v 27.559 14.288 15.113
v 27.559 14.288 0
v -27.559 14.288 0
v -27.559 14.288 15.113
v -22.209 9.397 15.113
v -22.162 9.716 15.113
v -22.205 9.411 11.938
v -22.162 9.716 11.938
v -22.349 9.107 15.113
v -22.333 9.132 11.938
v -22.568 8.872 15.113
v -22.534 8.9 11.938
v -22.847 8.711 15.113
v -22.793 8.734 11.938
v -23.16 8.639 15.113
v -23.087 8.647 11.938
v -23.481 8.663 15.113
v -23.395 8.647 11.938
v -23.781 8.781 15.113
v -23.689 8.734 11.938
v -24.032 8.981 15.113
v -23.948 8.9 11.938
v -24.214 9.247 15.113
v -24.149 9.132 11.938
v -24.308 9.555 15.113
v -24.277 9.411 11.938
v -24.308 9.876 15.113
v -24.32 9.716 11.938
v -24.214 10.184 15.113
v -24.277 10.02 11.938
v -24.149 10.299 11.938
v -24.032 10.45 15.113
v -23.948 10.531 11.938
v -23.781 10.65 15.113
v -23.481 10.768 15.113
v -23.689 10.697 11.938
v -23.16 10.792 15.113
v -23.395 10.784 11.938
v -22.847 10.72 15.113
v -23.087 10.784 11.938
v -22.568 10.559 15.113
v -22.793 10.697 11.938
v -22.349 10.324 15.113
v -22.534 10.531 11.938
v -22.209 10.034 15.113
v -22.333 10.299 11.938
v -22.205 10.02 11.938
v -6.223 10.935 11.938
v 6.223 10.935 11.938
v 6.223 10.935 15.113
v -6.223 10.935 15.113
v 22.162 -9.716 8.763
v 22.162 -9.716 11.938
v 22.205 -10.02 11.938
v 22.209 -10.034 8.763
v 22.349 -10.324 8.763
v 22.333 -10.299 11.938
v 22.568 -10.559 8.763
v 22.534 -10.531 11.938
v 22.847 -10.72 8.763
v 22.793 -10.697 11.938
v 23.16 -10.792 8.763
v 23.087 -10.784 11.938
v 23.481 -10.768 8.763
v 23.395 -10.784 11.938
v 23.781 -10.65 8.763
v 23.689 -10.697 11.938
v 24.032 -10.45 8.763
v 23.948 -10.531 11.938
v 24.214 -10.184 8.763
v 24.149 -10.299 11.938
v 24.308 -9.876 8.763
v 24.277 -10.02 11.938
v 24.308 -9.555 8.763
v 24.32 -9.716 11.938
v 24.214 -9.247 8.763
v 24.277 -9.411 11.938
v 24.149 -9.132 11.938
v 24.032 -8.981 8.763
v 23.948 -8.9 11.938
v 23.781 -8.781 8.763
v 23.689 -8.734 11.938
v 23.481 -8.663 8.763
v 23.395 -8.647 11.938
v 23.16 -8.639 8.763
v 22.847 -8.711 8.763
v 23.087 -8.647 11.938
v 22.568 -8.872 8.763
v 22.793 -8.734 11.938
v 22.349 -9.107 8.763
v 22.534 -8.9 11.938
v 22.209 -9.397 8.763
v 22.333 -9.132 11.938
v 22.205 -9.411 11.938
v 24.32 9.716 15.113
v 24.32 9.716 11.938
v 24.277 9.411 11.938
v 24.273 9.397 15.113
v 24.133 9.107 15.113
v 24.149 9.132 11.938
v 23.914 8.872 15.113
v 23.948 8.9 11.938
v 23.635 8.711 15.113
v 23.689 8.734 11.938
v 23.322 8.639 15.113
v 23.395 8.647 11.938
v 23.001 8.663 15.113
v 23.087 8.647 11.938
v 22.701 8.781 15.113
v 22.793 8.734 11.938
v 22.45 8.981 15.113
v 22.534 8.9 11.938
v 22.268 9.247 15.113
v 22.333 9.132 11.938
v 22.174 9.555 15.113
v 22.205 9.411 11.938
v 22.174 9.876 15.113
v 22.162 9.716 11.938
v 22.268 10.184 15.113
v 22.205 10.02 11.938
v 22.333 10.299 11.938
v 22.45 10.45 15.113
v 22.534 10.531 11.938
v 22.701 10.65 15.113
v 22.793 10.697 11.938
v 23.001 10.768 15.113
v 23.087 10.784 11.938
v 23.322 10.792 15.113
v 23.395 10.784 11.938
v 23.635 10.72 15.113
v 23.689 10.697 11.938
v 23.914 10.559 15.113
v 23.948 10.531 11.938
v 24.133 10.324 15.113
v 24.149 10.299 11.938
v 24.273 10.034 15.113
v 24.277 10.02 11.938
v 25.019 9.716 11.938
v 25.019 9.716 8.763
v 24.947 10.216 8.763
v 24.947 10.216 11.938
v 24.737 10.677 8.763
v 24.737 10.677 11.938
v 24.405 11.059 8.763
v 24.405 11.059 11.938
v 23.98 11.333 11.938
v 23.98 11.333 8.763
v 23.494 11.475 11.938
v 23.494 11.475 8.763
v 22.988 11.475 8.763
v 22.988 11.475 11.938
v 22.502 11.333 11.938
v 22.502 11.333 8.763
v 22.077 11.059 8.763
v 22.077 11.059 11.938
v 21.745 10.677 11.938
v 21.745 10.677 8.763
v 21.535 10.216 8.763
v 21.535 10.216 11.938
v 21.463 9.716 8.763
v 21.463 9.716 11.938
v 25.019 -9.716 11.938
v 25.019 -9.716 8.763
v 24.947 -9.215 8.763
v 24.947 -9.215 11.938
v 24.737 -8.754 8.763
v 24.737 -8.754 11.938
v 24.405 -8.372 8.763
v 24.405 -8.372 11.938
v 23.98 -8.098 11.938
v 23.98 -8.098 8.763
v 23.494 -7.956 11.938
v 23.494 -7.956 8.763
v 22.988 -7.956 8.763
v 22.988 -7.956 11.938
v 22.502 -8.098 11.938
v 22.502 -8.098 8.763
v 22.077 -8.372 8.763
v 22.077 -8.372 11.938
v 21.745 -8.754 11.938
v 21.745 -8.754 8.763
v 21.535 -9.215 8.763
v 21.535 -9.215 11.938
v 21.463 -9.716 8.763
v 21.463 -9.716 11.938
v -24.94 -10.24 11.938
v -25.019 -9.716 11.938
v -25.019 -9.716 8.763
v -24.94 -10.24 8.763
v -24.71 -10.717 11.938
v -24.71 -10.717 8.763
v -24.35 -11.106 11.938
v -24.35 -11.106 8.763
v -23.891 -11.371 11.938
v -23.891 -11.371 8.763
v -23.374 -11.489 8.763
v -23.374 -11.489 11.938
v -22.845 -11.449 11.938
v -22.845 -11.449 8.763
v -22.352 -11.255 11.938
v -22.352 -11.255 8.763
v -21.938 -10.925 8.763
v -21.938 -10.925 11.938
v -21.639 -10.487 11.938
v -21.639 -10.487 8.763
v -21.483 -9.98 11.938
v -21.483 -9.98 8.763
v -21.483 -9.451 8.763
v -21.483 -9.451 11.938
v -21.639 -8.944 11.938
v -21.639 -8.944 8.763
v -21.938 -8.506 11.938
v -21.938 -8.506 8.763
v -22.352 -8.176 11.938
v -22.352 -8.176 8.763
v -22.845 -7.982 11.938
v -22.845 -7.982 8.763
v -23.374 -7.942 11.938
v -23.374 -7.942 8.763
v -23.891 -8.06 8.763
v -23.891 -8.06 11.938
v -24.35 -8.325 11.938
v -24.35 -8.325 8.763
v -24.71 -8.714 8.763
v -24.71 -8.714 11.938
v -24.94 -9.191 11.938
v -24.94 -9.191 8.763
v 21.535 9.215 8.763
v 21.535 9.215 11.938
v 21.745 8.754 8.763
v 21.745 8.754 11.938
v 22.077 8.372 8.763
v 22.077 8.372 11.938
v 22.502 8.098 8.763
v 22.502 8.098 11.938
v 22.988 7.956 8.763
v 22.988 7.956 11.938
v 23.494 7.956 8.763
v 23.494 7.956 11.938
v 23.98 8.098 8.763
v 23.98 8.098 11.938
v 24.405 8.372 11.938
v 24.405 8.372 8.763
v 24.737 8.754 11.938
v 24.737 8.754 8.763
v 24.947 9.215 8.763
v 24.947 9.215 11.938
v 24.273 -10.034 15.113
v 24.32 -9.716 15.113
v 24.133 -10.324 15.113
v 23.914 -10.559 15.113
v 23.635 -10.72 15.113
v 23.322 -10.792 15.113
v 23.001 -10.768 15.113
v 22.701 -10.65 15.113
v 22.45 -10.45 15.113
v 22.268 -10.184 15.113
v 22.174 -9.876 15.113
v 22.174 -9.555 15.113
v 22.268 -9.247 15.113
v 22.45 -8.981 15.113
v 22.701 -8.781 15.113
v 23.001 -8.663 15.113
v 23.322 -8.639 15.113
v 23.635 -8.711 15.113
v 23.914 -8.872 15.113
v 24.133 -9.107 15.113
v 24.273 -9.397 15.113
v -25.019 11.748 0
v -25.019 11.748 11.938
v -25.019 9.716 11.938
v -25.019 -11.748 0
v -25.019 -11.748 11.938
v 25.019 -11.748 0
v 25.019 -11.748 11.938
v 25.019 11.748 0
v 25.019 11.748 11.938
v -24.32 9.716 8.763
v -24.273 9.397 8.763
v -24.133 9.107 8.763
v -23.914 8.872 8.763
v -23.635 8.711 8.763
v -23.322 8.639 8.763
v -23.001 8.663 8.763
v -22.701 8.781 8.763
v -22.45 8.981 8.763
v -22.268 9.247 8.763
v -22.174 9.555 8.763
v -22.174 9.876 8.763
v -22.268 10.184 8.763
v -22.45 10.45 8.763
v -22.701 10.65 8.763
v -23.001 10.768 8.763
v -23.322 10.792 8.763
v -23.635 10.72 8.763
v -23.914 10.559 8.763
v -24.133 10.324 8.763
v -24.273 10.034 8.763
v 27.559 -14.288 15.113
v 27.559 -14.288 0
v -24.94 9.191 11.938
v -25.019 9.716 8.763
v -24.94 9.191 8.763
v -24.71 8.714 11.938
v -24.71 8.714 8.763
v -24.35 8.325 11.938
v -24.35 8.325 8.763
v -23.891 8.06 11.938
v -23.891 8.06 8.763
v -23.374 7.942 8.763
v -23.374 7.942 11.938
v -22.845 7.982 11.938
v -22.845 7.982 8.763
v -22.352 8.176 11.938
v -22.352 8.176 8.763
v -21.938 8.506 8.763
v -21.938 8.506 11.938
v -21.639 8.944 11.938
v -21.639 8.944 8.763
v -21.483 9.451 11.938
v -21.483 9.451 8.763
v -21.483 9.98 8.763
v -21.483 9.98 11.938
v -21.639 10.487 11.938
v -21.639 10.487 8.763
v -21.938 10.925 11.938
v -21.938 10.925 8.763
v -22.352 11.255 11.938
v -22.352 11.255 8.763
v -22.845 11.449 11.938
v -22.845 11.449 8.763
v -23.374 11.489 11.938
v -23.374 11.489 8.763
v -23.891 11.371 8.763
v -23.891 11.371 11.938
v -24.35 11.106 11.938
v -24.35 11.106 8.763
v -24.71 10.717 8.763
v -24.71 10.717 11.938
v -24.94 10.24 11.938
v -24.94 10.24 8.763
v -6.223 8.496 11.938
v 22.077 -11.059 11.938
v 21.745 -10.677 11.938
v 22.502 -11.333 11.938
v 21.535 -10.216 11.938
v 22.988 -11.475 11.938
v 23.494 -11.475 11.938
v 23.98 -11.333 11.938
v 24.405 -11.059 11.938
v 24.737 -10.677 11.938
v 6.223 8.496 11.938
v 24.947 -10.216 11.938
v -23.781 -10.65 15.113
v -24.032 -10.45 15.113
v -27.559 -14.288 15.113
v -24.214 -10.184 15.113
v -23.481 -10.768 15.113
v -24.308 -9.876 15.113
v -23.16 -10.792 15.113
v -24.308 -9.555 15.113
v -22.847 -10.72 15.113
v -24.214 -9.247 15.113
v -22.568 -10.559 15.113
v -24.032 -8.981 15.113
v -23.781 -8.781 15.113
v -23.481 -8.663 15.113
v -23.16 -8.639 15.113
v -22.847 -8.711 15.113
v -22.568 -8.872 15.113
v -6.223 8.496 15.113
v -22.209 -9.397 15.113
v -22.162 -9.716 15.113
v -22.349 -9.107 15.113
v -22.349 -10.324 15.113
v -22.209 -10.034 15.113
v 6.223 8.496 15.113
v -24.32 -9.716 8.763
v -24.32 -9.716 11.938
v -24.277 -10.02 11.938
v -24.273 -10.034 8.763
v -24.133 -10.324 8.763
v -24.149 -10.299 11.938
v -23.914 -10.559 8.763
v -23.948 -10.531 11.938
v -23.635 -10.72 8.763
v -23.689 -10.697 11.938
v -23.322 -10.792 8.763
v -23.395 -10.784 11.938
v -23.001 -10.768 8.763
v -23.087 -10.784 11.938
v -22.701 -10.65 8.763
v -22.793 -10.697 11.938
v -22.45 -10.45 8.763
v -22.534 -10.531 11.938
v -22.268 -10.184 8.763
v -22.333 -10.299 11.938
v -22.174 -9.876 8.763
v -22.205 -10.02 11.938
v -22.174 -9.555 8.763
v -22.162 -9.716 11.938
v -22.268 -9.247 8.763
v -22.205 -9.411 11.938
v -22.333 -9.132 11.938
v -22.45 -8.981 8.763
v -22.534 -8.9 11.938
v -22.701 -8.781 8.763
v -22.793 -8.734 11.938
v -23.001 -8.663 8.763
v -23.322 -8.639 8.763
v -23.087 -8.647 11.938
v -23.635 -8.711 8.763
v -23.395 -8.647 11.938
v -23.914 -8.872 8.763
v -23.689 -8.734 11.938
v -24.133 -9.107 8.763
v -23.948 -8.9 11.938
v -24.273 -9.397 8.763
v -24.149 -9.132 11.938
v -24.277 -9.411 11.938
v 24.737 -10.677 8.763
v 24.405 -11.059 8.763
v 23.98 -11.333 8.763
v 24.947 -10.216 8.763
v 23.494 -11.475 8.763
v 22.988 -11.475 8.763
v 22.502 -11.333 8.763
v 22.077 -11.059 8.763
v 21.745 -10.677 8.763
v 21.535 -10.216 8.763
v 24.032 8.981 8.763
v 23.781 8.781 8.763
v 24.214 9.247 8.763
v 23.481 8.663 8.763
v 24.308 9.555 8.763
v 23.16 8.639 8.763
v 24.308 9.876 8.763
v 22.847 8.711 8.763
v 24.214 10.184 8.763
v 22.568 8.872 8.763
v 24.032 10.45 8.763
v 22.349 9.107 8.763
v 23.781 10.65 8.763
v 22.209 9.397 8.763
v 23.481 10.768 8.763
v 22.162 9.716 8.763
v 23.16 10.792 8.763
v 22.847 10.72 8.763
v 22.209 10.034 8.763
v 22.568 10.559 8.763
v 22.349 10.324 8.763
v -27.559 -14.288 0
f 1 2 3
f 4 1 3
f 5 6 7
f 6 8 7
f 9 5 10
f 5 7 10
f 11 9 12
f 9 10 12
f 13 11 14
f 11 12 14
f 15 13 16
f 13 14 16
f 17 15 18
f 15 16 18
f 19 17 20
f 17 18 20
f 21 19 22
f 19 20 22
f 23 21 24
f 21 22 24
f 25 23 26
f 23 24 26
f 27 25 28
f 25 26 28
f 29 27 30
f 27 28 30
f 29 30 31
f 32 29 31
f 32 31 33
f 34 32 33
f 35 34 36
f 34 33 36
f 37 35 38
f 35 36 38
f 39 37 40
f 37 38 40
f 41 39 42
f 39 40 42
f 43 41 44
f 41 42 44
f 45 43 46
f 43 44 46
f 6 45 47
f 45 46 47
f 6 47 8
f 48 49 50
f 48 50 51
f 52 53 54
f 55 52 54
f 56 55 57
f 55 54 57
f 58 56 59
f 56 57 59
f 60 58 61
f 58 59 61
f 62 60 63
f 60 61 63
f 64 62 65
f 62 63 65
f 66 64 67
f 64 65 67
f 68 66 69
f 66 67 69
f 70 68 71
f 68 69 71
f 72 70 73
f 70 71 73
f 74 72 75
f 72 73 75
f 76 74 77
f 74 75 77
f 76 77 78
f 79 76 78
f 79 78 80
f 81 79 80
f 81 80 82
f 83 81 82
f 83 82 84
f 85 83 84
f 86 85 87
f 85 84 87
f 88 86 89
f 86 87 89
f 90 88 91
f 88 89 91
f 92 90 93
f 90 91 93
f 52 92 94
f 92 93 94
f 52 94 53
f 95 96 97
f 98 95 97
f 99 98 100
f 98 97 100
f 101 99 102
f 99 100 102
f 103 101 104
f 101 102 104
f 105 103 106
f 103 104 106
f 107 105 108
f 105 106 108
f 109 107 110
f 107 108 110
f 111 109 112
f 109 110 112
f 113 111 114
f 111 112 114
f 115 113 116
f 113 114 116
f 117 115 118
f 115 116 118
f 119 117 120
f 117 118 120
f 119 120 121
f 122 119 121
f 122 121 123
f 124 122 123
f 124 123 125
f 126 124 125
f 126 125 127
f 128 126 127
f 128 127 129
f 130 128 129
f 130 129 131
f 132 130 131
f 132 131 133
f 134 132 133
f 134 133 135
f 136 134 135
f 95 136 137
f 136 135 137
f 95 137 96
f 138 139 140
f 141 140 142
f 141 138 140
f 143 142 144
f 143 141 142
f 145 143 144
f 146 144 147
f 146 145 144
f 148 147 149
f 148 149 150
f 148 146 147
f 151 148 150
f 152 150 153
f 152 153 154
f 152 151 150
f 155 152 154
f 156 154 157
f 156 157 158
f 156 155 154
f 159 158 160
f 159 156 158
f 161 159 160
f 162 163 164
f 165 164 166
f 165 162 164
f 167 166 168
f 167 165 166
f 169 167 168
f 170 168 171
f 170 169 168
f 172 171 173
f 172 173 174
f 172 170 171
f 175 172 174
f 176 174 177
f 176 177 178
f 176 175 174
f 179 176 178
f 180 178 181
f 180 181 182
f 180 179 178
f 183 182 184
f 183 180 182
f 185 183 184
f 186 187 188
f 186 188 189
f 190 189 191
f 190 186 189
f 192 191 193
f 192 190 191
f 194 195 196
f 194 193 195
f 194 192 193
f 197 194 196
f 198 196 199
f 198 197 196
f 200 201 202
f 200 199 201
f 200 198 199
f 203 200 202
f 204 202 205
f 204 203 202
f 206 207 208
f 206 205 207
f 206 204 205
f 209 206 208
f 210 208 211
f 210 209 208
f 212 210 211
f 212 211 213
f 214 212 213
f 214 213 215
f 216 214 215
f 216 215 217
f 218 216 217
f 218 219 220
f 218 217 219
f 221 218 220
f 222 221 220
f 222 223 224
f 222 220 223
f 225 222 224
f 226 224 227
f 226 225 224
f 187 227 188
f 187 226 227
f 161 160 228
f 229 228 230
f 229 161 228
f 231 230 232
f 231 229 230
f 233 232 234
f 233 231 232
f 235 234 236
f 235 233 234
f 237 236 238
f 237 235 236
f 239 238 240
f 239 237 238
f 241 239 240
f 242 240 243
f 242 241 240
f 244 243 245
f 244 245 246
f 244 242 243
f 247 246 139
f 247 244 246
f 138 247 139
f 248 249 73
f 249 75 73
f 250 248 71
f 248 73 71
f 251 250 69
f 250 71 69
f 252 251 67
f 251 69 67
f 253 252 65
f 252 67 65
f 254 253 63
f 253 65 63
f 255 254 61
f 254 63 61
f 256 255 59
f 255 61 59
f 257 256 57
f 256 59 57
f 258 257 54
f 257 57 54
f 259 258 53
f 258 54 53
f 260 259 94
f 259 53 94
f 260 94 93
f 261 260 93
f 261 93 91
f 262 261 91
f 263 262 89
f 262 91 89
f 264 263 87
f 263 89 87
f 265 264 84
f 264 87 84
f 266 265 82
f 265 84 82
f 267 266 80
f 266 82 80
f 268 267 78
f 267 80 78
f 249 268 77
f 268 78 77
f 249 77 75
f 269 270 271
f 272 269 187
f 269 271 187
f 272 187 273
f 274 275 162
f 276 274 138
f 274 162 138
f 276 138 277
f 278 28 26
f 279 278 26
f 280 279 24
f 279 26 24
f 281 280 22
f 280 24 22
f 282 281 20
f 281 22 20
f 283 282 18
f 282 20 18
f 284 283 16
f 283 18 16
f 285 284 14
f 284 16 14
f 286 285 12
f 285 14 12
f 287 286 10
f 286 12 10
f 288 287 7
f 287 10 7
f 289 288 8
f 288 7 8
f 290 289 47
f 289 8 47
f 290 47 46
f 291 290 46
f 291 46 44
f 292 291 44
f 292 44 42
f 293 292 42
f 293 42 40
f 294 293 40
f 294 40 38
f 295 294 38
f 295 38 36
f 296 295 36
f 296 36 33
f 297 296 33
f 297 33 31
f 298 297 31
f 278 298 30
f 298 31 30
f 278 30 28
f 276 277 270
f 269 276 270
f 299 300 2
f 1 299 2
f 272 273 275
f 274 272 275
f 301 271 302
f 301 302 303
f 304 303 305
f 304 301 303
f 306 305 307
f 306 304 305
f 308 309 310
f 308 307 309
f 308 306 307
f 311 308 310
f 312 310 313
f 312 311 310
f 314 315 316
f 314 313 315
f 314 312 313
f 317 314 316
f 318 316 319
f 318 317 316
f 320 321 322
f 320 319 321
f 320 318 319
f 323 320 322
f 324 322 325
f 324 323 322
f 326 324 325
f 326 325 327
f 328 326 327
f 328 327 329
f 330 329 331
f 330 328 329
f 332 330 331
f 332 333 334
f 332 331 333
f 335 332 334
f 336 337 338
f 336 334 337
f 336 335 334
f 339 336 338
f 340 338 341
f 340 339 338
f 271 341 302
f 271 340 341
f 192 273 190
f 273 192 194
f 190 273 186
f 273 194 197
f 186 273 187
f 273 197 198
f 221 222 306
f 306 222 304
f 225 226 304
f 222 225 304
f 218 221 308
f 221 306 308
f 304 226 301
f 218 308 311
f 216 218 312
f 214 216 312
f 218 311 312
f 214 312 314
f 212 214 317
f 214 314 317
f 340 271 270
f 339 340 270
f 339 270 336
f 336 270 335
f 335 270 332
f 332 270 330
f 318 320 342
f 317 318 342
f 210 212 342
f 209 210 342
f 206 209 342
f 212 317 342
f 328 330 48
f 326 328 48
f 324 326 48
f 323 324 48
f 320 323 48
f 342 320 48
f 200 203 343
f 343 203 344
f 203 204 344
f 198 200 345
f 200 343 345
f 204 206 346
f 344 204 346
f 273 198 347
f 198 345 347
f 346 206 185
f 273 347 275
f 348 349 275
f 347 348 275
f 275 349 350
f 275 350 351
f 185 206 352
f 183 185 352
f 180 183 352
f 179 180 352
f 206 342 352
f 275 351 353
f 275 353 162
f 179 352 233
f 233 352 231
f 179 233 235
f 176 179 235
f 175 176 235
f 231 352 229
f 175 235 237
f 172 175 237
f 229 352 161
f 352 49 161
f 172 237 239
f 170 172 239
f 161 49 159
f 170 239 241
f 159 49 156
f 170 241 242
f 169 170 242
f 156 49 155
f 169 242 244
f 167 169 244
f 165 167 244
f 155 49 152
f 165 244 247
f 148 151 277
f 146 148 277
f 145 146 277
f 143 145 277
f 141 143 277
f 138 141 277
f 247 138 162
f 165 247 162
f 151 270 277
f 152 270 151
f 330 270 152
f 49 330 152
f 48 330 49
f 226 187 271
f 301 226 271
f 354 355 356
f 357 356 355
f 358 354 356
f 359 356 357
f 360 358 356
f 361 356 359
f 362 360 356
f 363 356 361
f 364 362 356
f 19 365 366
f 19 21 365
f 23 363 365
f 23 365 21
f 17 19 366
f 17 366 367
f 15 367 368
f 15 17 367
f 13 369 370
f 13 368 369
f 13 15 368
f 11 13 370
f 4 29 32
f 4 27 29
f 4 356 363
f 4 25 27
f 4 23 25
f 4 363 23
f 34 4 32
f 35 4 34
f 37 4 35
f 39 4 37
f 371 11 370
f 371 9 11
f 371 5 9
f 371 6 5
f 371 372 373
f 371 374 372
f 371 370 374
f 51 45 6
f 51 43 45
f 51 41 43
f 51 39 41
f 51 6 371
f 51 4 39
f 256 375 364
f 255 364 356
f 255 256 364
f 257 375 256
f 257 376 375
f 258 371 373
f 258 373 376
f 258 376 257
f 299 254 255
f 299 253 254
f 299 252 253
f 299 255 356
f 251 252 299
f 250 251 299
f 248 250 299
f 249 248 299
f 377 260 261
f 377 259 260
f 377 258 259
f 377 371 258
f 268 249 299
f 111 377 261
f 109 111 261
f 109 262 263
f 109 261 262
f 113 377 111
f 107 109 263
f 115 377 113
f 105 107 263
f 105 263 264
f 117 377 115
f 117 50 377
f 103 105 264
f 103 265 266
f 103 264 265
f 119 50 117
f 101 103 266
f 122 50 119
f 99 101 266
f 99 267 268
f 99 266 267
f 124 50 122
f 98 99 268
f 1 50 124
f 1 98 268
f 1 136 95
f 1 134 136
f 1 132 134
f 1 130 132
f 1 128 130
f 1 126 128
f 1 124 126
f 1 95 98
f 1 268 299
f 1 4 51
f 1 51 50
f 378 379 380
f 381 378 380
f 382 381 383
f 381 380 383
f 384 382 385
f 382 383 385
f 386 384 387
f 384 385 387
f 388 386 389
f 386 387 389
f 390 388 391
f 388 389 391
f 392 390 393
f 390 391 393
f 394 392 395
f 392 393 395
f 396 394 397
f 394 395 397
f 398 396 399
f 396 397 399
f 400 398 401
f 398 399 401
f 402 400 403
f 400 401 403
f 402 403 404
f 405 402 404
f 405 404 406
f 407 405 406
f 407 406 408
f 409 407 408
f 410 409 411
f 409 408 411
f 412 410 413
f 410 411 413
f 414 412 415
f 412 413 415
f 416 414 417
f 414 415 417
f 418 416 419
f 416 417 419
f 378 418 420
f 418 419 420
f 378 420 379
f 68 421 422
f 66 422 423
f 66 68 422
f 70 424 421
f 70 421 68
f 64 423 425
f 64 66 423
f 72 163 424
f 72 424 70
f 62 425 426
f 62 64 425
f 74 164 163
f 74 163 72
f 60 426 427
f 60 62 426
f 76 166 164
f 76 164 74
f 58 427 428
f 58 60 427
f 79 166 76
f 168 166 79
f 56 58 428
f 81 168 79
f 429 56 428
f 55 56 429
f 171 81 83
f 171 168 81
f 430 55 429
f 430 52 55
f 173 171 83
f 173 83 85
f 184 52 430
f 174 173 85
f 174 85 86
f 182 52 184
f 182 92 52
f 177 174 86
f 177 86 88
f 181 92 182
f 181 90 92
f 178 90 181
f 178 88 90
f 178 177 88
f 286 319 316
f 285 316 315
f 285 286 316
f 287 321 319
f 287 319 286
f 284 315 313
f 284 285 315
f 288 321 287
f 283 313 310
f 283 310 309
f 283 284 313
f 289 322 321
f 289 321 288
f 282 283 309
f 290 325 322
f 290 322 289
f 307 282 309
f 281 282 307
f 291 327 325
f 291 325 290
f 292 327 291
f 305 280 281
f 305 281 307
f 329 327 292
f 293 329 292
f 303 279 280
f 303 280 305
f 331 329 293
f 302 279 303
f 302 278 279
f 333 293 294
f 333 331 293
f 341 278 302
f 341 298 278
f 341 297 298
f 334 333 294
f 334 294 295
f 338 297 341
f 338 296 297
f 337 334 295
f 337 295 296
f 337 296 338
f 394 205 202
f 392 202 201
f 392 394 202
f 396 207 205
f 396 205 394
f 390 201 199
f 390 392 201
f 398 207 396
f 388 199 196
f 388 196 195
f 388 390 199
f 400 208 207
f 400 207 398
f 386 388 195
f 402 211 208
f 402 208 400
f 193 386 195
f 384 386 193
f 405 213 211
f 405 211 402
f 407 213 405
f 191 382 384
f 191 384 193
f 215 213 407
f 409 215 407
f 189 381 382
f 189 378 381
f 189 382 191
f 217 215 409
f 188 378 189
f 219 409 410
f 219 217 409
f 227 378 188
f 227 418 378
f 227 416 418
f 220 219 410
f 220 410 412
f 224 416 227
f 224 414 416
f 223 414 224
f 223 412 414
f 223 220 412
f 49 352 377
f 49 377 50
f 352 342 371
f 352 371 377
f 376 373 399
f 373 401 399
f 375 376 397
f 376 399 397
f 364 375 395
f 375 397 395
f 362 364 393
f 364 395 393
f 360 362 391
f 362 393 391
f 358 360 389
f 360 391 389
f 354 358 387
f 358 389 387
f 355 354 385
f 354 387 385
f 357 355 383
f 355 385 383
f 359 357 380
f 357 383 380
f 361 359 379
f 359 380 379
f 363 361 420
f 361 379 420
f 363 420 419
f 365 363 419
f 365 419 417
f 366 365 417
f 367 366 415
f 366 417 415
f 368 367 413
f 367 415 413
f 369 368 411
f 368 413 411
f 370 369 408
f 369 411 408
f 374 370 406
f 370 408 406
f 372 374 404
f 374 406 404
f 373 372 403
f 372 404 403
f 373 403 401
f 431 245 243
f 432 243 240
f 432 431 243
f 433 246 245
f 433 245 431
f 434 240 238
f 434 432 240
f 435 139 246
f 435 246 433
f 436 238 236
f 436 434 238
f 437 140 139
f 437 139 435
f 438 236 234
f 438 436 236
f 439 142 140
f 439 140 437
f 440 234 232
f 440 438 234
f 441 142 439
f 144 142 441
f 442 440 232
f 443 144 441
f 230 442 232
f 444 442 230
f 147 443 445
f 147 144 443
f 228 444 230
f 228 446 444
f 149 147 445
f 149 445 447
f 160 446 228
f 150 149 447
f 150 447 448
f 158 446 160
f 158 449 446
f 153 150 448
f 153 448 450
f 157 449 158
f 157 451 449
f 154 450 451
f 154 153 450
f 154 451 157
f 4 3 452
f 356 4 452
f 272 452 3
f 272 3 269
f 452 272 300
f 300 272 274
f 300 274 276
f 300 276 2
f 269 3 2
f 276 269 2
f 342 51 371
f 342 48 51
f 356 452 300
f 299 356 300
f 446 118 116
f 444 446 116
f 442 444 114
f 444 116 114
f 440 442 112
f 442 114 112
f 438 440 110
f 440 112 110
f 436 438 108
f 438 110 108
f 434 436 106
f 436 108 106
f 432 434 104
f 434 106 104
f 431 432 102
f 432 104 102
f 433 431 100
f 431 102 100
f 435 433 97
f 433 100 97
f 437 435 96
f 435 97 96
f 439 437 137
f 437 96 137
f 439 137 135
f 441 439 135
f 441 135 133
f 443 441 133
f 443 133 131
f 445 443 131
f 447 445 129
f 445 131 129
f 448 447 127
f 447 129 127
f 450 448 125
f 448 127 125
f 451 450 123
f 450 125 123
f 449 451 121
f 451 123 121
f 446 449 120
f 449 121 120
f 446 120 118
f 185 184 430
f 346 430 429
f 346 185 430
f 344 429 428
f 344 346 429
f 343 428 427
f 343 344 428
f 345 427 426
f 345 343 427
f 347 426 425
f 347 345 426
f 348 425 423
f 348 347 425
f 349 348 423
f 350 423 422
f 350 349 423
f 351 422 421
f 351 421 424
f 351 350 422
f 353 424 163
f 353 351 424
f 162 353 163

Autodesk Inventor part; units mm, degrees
ref_plane "YZ Plane" through (0, 0, 0) normal (1, 0, 0) x (0, 1, 0)
ref_plane "XZ Plane" through (0, 0, 0) normal (0, 1, 0) x (-1, 0, 0)
sketch "Sketch1" plane through (0, 0, 0) normal (0, 0, 1) x (1, 0, 0)
  line L0 (-27.559, -14.2875) -> (27.559, -14.2875)
  line L1 (27.559, -14.2875) -> (27.559, 14.2875)
  line L2 (27.559, 14.2875) -> (-27.559, 14.2875)
  line L3 (-27.559, 14.2875) -> (-27.559, -14.2875)
  line L4 (-27.559, -14.2875) -> (27.559, 14.2875) construction
  line L5 (27.559, -14.2875) -> (-27.559, 14.2875) construction
  line L6 (0, 0) -> (0, 51.7616) construction
  line L7 (-6.223, 8.4963) -> (6.223, 8.4963)
  line L8 (6.223, 8.4963) -> (6.223, 10.9347)
  line L9 (6.223, 10.9347) -> (-6.223, 10.9347)
  line L10 (-6.223, 10.9347) -> (-6.223, 8.4963)
  line L11 (-6.223, 8.4963) -> (6.223, 10.9347) construction
  line L12 (6.223, 8.4963) -> (-6.223, 10.9347) construction
  circle A0 centre (-23.241, 9.7155) radius 1.0795
  circle A1 centre (23.241, 9.7155) radius 1.0795
  circle A2 centre (-23.241, -9.7155) radius 1.0795
  circle A3 centre (23.241, -9.7155) radius 1.0795
  point P0 (0, 9.7155)
  dimension "d0" = 55.118
  dimension "d1" = 28.575
  dimension "d2" = 12.446
  dimension "d3" = 2.4384
  dimension "d11" = 4.572
  dimension "d12" = 2.159
  dimension "d13" = 2.159
  dimension "d14" = 4.318
  dimension "d15" = 4.318
  dimension "d16" = 2.159
  dimension "d17" = 4.572
  dimension "d18" = 2.159
ref_plane "Work Plane1" through (0, 0, 11.938) normal (0, 0, 1) x (1, 0, 0)
sketch "Sketch2" plane through (0, 0, 11.938) normal (0, 0, 1) x (1, 0, 0)
  line L0 (-25.019, -11.7475) -> (25.019, -11.7475)
  line L1 (25.019, -11.7475) -> (25.019, 11.7475)
  line L2 (25.019, 11.7475) -> (-25.019, 11.7475)
  line L3 (-25.019, 11.7475) -> (-25.019, -11.7475)
  line L4 (-25.019, -11.7475) -> (25.019, 11.7475) construction
  line L5 (25.019, -11.7475) -> (-25.019, 11.7475) construction
  line L6 (27.559, 14.2875) -> (-27.559, 14.2875) projected
  line L7 (-27.559, 14.2875) -> (-27.559, -14.2875) projected
  point P0 (0, 0)
  dimension "d7" = 2.54
  dimension "d8" = 2.54
extrude "Extrusion3" add sketch "Sketch1" along normal blind 15.113
ref_plane "Work Plane2" through (0, 0, 2.54) normal (0, 0, 1) x (1, 0, 0)
extrude "Extrusion6" cut sketch "Sketch2" against normal blind 12.573
sketch "Sketch4" plane through (0, 0, 11.938) normal (0, 0, -1) x (-1, 0, 0)
  circle A0 centre (-23.241, 9.7155) radius 1.0795 projected
  circle A1 centre (-23.241, 9.7155) radius 1.0795
  circle A2 centre (-23.241, 9.7155) radius 1.778
  line L0 (-25.019, -11.7475) -> (-25.019, 11.7475) projected
  circle A3 centre (23.241, 9.7155) radius 1.0795 projected
  circle A4 centre (23.241, 9.7155) radius 1.0795
  circle A5 centre (23.241, 9.7155) radius 1.778
  line L1 (25.019, 11.7475) -> (25.019, -11.7475) projected
  circle A6 centre (23.241, -9.7155) radius 1.0795 projected
  circle A7 centre (23.241, -9.7155) radius 1.0795
  circle A8 centre (23.241, -9.7155) radius 1.778
  circle A9 centre (-23.241, -9.7155) radius 1.0795 projected
  circle A10 centre (-23.241, -9.7155) radius 1.0795
  circle A11 centre (-23.241, -9.7155) radius 1.778
  point P0 (0, 0)
extrude "Extrusion7" add sketch "Sketch4" along normal blind 3.175
properties part number "Display"
